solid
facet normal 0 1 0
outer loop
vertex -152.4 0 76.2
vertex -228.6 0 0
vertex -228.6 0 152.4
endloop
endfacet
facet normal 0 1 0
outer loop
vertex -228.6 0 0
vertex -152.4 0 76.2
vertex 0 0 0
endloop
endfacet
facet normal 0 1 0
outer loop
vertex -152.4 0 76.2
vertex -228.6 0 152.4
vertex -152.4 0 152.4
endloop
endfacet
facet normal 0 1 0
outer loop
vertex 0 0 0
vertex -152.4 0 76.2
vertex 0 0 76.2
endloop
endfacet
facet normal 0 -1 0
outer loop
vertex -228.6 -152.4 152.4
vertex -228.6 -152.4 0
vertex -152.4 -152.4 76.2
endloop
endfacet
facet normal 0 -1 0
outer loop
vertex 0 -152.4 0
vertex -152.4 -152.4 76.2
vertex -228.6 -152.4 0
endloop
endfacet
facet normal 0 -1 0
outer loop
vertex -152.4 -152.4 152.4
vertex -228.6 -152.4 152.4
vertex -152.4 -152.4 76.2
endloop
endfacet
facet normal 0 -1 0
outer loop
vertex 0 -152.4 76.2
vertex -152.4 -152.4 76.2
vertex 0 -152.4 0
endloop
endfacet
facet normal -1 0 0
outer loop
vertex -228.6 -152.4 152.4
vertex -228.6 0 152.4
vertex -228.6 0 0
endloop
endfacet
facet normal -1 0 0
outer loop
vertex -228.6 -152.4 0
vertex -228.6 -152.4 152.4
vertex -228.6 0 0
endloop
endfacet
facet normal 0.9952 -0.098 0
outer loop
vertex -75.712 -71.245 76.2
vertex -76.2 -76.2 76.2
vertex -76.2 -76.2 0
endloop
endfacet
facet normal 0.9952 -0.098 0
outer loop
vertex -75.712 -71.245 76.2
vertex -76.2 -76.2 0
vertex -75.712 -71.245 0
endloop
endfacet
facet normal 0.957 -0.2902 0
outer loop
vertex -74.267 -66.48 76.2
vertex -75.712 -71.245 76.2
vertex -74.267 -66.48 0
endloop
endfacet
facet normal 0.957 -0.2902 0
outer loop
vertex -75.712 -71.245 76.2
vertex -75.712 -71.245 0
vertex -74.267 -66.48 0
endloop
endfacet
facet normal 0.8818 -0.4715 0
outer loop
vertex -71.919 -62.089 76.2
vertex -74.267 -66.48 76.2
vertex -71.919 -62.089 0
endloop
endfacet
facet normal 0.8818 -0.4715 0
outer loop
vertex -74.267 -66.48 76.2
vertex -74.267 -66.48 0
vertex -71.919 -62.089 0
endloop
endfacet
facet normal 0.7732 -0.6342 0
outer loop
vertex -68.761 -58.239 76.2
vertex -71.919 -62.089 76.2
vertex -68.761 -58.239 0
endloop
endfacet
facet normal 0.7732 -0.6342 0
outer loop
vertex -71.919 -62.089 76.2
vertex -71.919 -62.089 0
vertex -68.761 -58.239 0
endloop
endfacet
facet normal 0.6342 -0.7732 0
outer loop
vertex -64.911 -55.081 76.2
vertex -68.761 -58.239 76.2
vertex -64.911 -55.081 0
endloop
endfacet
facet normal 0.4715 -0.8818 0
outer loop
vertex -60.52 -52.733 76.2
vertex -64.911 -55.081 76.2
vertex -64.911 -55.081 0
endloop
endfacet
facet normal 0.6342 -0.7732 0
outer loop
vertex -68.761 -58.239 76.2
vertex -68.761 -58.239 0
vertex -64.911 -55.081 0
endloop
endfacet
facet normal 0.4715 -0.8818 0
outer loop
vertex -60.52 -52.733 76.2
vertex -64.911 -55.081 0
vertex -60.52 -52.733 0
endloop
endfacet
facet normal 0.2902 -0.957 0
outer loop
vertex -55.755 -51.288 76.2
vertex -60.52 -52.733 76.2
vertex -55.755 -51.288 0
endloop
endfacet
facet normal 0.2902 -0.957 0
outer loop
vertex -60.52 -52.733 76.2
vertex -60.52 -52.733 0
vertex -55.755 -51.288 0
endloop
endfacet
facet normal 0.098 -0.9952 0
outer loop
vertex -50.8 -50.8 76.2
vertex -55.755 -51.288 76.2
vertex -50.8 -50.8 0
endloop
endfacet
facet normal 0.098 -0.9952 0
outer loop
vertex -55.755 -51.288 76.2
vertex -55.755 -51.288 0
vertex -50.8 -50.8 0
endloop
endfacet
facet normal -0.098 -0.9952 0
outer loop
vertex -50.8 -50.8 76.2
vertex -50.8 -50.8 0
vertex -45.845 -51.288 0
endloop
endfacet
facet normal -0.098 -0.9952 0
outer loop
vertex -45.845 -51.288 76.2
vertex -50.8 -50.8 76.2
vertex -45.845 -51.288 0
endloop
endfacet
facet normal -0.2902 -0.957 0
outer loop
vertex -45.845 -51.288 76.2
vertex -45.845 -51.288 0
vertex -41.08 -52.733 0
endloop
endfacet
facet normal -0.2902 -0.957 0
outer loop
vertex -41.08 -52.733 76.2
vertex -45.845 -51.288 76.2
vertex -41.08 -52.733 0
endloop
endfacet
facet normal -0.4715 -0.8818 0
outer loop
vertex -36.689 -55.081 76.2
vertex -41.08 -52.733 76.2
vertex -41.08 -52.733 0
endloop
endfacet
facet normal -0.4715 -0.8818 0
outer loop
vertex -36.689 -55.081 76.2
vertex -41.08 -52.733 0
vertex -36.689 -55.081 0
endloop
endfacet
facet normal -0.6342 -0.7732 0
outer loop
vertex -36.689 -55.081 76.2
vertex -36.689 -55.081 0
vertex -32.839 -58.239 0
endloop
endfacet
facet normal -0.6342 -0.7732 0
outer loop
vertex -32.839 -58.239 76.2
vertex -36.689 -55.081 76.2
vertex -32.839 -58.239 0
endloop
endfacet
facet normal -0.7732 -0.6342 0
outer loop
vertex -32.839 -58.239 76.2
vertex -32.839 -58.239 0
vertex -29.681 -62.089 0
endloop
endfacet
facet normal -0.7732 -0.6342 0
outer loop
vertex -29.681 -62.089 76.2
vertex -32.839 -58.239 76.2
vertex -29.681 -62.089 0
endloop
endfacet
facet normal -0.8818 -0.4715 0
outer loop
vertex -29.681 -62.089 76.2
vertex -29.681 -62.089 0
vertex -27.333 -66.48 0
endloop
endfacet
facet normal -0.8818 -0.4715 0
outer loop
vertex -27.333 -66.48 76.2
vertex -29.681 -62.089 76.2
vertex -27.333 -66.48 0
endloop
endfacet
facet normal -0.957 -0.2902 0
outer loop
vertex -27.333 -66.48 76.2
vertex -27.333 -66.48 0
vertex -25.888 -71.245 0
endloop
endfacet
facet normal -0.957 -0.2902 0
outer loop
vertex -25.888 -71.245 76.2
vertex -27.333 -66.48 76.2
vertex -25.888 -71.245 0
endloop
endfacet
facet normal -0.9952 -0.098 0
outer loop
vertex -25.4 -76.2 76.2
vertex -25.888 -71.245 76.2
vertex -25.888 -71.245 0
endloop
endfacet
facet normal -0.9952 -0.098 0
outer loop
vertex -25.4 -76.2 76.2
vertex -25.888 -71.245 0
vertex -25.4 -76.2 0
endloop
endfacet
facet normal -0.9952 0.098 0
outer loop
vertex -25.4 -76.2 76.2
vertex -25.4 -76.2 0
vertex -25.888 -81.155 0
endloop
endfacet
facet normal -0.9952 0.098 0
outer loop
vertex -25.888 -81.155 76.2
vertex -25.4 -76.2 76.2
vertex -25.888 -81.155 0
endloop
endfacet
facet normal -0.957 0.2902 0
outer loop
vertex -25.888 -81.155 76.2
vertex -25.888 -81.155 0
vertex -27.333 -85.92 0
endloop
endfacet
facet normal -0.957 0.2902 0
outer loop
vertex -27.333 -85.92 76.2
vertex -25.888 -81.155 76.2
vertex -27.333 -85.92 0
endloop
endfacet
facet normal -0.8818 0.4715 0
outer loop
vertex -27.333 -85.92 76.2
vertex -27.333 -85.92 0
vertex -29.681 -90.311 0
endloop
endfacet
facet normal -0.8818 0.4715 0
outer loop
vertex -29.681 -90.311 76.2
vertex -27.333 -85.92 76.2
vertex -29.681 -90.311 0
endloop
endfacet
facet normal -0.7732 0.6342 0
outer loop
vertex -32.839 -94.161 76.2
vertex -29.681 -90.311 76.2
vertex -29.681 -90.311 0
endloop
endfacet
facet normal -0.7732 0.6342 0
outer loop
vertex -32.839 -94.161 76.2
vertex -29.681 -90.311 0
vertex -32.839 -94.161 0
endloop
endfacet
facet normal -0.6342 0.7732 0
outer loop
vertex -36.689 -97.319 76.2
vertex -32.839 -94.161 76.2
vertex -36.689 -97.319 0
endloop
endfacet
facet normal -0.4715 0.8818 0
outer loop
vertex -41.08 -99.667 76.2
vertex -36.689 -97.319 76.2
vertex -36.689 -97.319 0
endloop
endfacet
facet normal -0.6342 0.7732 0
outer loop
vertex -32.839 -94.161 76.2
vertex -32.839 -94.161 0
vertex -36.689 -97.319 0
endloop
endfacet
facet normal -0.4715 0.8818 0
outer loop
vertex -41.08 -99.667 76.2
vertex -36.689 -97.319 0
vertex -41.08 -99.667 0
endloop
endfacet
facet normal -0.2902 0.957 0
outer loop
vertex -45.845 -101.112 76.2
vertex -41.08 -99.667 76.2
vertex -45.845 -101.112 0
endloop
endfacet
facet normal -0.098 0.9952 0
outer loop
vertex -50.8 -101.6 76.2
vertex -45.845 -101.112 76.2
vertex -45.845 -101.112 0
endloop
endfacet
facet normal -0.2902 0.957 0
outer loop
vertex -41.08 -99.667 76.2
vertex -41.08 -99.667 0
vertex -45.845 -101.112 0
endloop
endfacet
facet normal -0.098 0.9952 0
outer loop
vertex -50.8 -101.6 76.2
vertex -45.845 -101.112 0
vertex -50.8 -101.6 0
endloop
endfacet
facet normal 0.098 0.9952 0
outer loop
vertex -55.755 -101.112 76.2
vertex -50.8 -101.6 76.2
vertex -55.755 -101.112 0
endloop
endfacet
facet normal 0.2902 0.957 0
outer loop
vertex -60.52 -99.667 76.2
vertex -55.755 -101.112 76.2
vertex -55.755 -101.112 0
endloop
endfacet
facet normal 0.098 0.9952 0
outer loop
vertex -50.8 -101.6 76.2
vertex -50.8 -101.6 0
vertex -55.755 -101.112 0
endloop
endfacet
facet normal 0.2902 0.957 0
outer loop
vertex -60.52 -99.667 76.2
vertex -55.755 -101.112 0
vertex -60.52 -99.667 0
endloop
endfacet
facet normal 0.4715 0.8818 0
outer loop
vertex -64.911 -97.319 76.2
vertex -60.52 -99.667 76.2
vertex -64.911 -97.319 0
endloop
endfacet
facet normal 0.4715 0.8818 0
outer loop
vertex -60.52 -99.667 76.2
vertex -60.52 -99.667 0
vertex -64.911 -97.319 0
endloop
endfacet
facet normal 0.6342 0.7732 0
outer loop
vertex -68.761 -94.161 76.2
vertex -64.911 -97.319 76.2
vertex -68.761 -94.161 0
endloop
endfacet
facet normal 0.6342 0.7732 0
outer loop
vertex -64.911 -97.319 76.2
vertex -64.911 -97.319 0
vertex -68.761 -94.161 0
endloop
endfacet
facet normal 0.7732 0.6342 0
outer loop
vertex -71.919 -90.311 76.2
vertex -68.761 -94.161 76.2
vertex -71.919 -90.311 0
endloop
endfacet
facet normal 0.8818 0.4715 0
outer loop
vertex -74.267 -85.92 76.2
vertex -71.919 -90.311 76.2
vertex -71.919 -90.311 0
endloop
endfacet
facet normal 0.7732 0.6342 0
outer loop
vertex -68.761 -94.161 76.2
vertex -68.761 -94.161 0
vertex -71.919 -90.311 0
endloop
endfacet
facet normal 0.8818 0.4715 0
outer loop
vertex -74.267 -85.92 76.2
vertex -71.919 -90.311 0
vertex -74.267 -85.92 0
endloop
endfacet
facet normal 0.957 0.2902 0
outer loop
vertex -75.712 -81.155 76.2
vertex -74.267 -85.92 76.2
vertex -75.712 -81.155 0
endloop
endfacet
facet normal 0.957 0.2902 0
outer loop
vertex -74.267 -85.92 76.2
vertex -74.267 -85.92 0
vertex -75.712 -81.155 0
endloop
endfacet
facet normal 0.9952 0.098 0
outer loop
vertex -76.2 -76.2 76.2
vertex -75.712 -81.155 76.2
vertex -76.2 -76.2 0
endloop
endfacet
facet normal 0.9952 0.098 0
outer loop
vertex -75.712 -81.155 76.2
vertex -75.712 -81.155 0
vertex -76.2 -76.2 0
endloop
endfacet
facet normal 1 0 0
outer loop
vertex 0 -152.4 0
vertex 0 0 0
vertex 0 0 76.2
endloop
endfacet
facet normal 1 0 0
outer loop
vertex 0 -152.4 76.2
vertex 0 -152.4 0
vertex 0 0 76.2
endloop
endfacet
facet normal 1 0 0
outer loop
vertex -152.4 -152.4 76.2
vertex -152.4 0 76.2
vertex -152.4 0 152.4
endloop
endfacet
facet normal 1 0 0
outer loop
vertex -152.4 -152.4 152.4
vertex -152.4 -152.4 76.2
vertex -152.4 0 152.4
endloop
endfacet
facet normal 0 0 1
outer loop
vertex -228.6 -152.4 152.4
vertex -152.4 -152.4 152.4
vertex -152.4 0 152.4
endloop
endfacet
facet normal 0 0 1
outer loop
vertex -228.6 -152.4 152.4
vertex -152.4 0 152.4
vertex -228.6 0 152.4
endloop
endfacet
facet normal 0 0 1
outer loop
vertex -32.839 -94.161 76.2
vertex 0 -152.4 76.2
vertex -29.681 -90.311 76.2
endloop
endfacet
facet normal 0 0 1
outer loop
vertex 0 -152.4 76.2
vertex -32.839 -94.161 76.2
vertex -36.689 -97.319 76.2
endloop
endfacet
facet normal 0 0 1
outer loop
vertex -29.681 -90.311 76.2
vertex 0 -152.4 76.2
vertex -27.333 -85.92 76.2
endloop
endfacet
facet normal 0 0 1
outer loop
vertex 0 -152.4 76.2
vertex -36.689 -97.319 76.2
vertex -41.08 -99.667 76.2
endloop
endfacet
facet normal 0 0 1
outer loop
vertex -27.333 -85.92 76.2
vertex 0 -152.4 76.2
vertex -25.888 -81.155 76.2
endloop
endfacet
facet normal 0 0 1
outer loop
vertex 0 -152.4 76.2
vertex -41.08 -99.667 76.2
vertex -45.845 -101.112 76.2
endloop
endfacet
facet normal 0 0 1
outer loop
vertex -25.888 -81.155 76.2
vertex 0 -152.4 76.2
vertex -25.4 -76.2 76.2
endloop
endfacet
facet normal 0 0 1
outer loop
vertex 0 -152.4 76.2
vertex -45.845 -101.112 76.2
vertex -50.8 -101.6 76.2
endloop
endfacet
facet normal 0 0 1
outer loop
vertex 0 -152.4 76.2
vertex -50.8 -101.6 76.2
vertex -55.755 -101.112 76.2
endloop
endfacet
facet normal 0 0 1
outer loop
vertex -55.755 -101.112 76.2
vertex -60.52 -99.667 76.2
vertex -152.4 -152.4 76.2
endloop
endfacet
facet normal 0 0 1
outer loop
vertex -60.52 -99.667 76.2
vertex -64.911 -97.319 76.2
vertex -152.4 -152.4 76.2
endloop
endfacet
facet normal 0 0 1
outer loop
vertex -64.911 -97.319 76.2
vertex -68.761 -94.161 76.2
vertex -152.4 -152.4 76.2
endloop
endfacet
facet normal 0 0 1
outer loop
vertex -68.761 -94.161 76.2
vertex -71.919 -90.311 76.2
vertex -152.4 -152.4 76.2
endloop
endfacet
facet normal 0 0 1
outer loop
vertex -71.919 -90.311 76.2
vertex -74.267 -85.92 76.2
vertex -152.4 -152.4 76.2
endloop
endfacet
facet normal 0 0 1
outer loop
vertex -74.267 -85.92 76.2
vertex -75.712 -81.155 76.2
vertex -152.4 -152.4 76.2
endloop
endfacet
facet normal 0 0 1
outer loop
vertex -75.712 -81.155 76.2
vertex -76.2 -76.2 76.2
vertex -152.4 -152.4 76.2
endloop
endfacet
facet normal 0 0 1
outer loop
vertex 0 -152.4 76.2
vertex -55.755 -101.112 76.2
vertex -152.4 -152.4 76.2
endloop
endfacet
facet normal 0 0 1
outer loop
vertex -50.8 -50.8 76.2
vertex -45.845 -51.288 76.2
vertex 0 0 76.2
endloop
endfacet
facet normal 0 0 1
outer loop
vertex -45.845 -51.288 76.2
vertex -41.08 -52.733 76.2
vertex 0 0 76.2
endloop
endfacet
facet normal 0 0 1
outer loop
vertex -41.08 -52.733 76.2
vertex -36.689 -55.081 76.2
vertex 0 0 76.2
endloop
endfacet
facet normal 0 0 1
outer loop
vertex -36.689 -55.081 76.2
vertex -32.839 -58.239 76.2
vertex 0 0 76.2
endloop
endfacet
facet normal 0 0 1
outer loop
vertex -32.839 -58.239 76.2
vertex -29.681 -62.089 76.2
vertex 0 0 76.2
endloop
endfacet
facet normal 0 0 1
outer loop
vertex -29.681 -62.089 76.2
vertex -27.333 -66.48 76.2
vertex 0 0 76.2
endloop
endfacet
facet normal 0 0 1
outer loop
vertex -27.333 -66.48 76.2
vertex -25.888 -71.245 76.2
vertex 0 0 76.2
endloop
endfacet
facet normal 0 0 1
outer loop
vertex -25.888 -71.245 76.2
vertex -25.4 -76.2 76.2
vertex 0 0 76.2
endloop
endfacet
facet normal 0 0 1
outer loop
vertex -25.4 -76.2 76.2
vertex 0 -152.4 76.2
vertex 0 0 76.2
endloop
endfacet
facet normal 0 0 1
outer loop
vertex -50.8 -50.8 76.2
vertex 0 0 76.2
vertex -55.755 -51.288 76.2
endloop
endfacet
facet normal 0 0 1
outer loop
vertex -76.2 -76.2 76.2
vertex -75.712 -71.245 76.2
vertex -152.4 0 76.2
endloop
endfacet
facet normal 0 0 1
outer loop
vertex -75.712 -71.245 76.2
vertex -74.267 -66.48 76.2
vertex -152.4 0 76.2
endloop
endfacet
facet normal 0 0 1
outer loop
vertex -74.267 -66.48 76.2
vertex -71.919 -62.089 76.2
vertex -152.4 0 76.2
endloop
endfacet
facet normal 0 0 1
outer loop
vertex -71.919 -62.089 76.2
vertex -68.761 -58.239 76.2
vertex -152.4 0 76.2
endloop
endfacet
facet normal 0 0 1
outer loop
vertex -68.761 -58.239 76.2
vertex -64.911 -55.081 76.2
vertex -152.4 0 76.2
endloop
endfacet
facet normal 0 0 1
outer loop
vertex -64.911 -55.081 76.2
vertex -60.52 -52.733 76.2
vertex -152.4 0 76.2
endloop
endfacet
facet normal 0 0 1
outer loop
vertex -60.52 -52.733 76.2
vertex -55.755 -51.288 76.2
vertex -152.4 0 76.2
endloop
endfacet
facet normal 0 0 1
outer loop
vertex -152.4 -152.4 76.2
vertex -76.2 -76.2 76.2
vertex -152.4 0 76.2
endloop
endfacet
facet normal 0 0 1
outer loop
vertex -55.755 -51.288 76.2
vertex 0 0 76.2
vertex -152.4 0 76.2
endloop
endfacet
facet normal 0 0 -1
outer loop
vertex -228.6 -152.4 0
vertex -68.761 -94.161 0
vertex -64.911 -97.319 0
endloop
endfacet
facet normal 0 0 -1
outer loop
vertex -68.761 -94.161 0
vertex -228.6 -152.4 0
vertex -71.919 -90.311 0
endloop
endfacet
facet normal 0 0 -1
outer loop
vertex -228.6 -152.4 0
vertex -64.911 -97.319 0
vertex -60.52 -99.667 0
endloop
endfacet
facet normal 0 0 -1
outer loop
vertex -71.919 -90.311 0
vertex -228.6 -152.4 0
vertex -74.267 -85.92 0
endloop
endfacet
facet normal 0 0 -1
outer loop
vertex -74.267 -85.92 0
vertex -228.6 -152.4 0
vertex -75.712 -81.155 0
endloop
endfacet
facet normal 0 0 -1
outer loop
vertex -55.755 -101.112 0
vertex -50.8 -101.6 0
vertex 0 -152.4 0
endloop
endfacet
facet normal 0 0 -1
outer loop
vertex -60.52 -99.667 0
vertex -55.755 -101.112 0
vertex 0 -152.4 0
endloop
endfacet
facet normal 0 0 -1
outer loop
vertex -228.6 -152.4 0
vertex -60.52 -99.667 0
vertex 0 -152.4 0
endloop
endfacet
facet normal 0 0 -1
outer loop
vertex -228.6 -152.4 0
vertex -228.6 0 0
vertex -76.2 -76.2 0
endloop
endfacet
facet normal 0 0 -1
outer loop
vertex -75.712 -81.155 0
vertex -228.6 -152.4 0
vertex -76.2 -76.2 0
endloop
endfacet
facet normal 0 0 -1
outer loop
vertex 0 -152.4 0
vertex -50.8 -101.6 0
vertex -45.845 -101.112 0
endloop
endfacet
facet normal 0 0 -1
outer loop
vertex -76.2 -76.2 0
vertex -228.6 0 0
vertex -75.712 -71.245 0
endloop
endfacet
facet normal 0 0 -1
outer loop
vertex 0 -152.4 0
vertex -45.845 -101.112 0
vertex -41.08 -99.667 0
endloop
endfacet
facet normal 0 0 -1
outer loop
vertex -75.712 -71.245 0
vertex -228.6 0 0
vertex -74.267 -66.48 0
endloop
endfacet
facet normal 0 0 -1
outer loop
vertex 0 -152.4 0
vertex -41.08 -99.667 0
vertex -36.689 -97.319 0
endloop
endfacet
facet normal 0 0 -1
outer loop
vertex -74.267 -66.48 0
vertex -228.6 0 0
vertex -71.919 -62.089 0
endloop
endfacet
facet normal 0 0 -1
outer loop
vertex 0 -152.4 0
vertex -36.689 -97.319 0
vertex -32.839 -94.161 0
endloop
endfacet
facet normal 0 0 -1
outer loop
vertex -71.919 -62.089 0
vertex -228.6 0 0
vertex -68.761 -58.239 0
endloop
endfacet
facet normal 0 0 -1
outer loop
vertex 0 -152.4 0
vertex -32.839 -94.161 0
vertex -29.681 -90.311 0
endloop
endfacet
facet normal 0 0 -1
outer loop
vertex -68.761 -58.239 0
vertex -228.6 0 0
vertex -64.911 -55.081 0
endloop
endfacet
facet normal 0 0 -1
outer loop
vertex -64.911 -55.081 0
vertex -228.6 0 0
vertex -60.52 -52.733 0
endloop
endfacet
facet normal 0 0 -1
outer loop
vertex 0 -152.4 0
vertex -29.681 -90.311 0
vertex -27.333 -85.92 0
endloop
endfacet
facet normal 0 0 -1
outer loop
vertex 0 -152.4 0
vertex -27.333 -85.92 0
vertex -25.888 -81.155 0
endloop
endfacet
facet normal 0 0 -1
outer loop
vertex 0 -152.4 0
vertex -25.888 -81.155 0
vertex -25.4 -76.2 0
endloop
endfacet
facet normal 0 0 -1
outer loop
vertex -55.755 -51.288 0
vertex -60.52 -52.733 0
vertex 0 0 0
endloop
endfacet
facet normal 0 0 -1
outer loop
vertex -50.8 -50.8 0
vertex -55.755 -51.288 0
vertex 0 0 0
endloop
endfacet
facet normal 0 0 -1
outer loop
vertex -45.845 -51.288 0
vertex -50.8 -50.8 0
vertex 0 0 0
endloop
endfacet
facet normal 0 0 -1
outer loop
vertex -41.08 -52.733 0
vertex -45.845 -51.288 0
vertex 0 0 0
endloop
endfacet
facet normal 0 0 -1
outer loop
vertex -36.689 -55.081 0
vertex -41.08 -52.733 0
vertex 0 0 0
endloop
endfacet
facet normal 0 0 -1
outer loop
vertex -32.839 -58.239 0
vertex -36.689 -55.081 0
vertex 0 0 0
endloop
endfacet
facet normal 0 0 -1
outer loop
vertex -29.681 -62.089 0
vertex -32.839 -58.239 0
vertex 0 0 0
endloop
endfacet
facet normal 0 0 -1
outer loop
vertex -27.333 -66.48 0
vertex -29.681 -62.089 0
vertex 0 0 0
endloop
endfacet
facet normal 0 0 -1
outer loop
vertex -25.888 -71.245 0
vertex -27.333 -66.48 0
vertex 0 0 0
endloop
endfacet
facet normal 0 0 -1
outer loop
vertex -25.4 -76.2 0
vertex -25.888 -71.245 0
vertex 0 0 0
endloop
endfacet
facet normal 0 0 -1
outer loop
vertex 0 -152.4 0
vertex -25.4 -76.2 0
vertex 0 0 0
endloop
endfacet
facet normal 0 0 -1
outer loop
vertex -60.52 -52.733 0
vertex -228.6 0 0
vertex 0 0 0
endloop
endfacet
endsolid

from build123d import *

# Parameters (mm, degrees)
F1_DEPTH = 152.4
F3_D     = 50.8


with BuildPart() as f1:
    # F0 (on Front) → F1 (new body)
    with BuildSketch(Plane.XZ):
        Polygon((-228.6, 0), (0, 0), (0, 76.2), (-152.4, 76.2), (-152.4, 152.4), (-228.6, 152.4), align=None)
    extrude(amount=F1_DEPTH)

    # F3 (through all)
    with Locations(Plane.XY.offset(76.2)):
        with Locations((-50.8, -76.2)):
            Hole(F3_D / 2)


solid = f1.part
